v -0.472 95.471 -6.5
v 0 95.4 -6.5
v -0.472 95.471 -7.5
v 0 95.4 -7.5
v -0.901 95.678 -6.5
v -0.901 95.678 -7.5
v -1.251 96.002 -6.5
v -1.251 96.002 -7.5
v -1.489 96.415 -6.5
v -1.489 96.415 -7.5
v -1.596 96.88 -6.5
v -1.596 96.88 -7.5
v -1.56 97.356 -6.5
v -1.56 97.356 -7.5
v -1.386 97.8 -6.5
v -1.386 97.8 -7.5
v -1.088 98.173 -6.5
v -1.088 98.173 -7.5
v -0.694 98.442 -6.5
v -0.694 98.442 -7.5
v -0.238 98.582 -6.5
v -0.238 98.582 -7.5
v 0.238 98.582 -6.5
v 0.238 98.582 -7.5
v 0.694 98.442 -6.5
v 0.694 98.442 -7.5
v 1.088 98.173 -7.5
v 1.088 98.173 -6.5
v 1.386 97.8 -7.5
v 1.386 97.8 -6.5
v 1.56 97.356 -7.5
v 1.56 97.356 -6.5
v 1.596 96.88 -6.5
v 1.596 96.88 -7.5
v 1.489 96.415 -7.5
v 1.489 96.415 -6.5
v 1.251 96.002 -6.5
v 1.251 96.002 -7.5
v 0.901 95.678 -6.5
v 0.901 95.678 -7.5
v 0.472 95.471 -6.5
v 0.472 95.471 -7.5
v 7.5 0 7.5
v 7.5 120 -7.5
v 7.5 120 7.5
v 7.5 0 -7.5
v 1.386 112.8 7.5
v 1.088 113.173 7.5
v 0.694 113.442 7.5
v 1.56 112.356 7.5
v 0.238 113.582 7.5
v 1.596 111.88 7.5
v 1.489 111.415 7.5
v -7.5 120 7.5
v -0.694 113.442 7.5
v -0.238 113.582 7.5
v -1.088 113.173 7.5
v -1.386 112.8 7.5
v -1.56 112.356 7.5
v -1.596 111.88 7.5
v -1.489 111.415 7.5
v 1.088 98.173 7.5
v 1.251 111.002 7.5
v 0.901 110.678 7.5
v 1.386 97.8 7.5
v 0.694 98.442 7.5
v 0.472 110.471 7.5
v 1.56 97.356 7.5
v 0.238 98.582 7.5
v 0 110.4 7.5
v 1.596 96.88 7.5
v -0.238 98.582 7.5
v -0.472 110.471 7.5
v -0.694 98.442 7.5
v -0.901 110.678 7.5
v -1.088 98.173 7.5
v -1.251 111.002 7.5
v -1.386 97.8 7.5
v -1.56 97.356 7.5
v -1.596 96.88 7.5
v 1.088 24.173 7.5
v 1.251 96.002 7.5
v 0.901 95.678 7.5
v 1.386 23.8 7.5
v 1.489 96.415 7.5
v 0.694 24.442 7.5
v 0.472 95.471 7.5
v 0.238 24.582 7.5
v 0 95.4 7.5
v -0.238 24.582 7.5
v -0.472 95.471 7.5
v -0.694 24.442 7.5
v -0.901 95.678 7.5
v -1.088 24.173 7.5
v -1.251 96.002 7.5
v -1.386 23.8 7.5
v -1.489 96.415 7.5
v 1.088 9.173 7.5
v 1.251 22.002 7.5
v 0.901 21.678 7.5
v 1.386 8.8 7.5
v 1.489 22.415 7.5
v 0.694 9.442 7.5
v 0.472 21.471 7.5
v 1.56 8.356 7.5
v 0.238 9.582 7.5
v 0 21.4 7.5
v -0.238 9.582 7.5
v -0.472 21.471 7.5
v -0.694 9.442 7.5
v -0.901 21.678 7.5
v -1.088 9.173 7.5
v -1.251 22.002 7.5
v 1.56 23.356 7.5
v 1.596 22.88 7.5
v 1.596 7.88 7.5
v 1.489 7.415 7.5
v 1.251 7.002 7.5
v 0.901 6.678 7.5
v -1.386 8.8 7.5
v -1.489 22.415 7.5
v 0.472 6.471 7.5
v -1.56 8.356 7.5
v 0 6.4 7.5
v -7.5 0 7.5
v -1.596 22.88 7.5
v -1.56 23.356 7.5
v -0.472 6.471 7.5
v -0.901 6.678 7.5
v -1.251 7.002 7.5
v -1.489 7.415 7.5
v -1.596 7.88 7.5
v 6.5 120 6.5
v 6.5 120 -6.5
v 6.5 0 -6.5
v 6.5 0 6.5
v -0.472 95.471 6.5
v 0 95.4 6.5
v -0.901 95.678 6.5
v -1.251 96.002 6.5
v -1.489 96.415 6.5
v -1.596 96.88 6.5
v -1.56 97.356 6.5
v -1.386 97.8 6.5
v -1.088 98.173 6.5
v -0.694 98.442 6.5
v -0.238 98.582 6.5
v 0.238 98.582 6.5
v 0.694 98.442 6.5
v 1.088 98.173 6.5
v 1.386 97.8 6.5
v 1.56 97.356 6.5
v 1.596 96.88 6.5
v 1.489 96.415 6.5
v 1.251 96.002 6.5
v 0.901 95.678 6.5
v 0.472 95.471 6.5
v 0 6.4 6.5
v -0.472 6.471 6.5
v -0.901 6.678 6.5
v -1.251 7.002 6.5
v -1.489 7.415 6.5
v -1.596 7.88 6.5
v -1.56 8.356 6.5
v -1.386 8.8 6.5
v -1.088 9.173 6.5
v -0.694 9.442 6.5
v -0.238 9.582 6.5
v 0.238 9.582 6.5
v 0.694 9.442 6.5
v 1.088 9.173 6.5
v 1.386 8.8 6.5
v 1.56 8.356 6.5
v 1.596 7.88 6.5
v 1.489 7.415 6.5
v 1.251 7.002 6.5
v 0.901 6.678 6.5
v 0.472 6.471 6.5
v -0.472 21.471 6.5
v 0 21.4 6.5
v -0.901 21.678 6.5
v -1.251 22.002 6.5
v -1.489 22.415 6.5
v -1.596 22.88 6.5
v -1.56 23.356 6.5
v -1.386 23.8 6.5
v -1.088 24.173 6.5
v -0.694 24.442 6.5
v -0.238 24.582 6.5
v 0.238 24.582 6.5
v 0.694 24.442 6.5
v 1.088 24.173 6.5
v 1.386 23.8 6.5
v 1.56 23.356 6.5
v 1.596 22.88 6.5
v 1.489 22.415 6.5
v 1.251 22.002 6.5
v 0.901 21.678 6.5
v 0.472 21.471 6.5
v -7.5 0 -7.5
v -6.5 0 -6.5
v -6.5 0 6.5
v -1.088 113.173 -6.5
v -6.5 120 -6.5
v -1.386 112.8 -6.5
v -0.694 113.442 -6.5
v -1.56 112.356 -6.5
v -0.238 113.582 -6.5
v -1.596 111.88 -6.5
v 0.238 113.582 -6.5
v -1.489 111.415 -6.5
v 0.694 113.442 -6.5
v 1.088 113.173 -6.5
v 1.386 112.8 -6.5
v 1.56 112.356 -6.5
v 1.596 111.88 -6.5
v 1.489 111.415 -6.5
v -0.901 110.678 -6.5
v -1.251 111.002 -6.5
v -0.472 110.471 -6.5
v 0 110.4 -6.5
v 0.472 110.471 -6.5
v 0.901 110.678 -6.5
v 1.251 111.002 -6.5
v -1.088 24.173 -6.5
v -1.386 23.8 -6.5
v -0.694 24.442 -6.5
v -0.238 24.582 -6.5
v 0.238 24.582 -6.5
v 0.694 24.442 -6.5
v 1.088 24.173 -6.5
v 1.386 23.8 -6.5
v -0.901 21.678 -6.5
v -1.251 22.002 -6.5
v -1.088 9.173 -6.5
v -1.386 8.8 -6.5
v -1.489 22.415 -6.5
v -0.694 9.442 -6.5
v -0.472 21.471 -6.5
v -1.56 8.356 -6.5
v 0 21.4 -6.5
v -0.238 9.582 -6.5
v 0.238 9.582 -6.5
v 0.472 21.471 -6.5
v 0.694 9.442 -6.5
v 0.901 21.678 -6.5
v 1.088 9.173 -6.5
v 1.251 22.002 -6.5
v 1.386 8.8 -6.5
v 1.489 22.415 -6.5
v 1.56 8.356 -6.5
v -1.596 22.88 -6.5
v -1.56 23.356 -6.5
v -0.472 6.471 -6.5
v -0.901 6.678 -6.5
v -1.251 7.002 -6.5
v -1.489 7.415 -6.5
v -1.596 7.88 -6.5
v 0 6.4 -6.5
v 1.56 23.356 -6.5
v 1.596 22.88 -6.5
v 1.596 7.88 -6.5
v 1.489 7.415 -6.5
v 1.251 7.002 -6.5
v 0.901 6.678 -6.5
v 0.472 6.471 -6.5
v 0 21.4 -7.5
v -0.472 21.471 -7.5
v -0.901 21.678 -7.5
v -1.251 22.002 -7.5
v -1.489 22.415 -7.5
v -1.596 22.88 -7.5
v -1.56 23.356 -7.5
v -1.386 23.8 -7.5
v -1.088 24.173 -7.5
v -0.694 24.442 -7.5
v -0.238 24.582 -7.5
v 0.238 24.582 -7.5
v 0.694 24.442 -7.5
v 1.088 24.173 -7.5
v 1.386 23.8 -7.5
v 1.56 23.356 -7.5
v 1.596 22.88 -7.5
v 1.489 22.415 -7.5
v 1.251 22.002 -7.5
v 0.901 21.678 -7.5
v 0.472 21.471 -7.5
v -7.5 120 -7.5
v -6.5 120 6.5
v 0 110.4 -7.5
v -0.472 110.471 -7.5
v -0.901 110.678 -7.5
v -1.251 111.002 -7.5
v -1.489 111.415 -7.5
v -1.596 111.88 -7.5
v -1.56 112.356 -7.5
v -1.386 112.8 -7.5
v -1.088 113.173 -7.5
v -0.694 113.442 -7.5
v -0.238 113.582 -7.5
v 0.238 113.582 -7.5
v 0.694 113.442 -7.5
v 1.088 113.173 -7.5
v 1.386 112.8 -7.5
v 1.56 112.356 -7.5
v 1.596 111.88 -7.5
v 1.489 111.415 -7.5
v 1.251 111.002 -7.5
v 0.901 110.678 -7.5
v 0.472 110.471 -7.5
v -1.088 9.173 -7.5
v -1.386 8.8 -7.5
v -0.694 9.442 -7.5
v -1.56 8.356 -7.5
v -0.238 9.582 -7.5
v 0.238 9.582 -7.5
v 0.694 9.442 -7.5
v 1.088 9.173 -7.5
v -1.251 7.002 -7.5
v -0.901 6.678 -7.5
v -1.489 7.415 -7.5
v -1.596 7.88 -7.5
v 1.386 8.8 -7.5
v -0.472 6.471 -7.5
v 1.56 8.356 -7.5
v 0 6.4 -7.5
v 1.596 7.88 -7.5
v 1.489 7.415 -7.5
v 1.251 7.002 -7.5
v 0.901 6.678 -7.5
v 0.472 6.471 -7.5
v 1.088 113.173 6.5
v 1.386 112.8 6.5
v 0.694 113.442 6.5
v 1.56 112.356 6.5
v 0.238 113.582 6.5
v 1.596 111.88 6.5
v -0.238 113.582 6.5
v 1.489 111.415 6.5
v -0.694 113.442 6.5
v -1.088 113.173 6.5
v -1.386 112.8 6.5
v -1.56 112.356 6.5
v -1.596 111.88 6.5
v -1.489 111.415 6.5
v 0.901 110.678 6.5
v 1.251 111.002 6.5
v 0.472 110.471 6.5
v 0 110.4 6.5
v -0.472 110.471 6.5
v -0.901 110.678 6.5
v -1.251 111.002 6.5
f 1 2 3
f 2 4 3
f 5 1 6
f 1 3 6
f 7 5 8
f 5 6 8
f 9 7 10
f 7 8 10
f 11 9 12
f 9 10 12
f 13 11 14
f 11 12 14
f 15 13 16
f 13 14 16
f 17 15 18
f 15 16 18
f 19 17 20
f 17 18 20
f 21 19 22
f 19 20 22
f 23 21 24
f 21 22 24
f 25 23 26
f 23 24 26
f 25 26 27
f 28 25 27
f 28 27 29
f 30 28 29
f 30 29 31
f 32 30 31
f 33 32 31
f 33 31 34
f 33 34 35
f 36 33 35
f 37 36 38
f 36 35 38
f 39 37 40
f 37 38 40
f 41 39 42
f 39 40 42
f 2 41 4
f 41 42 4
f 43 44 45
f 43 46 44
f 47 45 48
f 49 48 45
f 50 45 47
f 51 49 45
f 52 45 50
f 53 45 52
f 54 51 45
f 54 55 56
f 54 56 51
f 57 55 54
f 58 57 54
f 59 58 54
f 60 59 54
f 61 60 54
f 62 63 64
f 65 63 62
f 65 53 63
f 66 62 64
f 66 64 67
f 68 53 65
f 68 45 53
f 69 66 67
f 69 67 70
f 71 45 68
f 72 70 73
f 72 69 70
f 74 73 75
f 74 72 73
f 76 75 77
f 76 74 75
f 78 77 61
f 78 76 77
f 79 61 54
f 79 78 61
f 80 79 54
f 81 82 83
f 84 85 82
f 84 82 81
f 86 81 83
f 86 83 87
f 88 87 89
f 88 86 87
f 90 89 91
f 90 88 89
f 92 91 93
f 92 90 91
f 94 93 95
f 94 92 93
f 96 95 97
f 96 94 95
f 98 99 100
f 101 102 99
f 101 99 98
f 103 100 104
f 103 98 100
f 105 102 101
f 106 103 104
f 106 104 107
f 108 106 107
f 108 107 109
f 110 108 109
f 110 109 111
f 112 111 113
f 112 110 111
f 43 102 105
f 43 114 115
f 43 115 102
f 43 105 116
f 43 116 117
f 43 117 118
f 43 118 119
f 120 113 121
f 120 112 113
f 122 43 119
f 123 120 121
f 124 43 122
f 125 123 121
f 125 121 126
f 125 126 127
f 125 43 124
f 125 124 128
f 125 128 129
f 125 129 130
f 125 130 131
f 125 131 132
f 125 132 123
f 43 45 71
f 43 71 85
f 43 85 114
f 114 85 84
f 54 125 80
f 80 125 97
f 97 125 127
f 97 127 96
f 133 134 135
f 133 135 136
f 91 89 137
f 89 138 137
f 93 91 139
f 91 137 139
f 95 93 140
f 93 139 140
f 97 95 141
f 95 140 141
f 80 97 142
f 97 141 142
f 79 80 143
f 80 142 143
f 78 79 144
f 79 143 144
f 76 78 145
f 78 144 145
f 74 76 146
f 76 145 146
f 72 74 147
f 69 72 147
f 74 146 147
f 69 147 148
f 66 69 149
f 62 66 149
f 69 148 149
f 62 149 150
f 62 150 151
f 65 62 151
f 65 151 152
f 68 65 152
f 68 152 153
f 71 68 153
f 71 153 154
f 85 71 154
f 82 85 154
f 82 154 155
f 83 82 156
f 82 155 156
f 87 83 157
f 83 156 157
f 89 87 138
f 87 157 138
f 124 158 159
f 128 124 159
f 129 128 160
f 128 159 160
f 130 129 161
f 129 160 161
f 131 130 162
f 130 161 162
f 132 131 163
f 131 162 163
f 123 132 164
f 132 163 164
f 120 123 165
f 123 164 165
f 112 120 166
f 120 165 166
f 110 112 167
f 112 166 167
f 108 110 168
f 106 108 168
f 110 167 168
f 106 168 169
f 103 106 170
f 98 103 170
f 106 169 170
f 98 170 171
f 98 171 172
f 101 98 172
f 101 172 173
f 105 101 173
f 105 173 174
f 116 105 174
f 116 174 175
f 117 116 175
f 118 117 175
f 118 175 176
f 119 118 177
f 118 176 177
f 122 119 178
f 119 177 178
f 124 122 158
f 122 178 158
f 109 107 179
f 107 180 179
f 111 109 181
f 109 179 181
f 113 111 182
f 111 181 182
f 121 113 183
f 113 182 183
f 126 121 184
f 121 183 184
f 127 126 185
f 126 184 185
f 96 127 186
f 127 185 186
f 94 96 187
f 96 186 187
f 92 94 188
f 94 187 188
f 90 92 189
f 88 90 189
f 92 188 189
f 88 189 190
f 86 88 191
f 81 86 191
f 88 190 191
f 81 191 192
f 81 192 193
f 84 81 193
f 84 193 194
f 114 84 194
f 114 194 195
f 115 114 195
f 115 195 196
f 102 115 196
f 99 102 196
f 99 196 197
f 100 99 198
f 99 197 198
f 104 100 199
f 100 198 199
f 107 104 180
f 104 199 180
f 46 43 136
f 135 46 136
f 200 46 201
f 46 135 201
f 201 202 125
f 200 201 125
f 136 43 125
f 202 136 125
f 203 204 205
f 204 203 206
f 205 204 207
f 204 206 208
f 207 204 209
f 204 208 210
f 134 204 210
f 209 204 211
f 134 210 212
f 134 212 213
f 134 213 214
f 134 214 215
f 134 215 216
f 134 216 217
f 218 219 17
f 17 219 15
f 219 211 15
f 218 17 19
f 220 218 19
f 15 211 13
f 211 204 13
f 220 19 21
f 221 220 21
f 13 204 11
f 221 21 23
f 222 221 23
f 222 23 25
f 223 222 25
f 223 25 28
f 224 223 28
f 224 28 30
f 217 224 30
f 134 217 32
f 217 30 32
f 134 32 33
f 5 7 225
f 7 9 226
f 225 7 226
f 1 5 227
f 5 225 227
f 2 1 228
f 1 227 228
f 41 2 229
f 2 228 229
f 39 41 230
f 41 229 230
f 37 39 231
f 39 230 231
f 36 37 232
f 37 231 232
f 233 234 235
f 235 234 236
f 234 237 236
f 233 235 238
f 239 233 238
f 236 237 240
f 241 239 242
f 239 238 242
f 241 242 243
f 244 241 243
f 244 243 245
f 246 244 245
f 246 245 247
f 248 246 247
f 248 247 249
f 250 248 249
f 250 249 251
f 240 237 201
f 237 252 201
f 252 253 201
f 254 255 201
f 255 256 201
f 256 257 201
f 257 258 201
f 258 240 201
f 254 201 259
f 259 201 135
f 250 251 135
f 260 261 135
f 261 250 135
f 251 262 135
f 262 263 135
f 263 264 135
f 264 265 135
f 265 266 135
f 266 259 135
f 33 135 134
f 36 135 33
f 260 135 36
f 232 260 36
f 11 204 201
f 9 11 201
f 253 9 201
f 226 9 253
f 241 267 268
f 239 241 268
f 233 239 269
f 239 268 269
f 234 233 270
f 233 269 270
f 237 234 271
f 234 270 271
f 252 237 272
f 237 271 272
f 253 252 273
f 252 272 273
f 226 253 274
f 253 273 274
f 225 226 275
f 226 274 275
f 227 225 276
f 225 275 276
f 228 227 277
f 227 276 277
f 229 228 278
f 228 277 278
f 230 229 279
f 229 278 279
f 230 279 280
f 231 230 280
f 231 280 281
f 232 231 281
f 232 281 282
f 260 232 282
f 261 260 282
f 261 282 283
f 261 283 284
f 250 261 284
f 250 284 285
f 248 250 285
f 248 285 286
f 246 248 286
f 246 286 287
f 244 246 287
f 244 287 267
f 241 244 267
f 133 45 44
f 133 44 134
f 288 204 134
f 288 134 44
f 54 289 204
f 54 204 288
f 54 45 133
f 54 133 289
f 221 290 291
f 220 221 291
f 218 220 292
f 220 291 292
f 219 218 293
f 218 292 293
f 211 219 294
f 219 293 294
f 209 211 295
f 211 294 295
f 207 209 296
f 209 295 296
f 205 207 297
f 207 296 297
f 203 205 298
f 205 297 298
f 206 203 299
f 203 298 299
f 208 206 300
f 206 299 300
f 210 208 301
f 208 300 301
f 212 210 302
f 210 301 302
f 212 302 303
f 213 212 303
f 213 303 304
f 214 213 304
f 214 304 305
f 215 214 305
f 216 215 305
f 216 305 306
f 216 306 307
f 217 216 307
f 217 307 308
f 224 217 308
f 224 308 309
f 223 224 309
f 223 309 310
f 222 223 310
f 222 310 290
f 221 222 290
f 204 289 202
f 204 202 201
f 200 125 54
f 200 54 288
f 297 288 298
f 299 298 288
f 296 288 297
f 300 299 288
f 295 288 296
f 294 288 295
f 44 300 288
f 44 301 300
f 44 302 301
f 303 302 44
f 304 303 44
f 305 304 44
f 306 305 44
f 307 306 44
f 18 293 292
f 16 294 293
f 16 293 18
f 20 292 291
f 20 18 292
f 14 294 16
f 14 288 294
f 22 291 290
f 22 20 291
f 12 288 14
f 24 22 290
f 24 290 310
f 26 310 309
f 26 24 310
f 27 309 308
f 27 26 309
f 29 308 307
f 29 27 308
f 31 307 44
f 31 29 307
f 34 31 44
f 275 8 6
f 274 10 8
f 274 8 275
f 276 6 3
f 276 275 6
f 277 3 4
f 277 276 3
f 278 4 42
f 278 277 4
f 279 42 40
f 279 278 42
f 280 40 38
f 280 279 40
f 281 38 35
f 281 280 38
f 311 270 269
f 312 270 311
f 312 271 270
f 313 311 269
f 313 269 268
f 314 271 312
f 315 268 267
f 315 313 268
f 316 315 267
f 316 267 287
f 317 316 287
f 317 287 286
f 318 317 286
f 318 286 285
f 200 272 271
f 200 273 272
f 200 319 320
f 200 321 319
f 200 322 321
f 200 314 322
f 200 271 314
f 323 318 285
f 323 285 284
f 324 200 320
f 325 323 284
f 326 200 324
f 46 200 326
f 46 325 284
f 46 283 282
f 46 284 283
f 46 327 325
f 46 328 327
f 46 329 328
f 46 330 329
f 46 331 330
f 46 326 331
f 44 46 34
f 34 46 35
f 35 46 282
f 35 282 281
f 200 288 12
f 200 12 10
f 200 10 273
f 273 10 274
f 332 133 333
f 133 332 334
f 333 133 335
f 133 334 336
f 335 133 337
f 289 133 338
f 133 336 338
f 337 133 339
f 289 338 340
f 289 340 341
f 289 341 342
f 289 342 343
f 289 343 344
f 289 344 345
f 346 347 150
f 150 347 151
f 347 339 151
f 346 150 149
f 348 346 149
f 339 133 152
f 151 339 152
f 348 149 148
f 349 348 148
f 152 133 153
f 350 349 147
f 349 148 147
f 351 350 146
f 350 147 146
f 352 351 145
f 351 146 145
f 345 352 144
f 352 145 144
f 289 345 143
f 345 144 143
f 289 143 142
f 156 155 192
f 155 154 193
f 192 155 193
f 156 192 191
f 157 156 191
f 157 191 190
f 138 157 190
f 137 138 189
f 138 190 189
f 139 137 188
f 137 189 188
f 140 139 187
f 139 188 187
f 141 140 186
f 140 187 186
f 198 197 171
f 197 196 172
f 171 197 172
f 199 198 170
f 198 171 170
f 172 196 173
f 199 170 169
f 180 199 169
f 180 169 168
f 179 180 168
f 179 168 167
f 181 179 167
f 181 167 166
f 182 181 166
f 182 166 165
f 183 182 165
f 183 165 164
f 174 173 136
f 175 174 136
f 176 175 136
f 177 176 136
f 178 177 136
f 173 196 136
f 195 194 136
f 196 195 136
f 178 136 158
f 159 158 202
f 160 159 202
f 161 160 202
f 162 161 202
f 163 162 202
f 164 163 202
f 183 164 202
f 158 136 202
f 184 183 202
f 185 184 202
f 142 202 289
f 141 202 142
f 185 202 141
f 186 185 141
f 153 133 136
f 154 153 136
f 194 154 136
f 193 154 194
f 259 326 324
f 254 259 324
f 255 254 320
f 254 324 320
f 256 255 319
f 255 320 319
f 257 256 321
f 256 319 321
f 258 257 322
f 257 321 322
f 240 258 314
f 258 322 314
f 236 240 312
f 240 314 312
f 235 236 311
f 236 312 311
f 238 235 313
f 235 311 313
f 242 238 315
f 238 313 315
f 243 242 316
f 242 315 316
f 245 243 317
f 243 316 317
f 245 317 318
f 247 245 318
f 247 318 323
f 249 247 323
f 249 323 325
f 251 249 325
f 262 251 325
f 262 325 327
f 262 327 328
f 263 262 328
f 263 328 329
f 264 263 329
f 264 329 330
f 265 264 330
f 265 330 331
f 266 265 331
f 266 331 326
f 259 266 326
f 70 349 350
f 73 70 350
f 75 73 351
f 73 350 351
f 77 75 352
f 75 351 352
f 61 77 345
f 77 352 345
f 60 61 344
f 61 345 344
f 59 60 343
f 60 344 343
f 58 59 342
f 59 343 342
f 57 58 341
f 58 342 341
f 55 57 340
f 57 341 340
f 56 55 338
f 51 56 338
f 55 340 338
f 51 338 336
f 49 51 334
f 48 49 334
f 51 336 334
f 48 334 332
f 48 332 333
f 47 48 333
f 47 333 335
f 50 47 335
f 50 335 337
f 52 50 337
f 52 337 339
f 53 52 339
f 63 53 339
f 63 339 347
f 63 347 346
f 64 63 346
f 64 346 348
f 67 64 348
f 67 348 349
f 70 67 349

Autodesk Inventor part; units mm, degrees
ref_plane "YZ Plane" through (0, 0, 0) normal (1, 0, 0) x (0, 1, 0)
ref_plane "XZ Plane" through (0, 0, 0) normal (0, 1, 0) x (-1, 0, 0)
ref_plane "XY Plane" through (0, 0, 0) normal (0, 0, 1) x (1, 0, 0)
sketch "スケッチ1" plane through (0, 0, 0) normal (0, 1, 0) x (-1, 0, 0)
  line L0 (7.5, -7.5) -> (-7.5, -7.5)
  line L1 (-7.5, -7.5) -> (-7.5, 7.5)
  line L2 (-7.5, 7.5) -> (7.5, 7.5)
  line L3 (7.5, 7.5) -> (7.5, -7.5)
  line L4 (7.5, -7.5) -> (-7.5, 7.5) construction
  line L5 (-7.5, -7.5) -> (7.5, 7.5) construction
  point P0 (0, 0)
  dimension "d0" = 15
  dimension "d1" = 15
extrude "押し出し1" add sketch "スケッチ1" along normal blind 120
shell "シェル1" thickness 1 removed faces 2 at (-2.5, 0, -2.5) at (-2.5, 120, -2.5)
sketch "スケッチ2" plane through (-7.5, 0, 7.5) normal (0, 0, 1) x (1, 0, 0)
  line L0 (15, 0) -> (0, 0) projected
  line L1 (0, 120) -> (15, 120) projected
  point P0 (7.5, 0)
  point P1 (7.5, 8)
  point P2 (7.5, 23)
  point P3 (7.5, 0)
  point P4 (7.5, 112)
  point P5 (7.5, 97)
  point P6 (7.5, 120)
  dimension "d5" = 8
  dimension "d6" = 15
  dimension "d14" = 8
  dimension "d15" = 15
hole "穴1" at (0, 8, 7.5) at (0, 23, 7.5) at (0, 112, 7.5) at (0, 97, 7.5) direction (0, 0, -1) diameter 3.2 end through all
properties part number "PitchSquarePipe" material "アルミニウム 5005-H12"
